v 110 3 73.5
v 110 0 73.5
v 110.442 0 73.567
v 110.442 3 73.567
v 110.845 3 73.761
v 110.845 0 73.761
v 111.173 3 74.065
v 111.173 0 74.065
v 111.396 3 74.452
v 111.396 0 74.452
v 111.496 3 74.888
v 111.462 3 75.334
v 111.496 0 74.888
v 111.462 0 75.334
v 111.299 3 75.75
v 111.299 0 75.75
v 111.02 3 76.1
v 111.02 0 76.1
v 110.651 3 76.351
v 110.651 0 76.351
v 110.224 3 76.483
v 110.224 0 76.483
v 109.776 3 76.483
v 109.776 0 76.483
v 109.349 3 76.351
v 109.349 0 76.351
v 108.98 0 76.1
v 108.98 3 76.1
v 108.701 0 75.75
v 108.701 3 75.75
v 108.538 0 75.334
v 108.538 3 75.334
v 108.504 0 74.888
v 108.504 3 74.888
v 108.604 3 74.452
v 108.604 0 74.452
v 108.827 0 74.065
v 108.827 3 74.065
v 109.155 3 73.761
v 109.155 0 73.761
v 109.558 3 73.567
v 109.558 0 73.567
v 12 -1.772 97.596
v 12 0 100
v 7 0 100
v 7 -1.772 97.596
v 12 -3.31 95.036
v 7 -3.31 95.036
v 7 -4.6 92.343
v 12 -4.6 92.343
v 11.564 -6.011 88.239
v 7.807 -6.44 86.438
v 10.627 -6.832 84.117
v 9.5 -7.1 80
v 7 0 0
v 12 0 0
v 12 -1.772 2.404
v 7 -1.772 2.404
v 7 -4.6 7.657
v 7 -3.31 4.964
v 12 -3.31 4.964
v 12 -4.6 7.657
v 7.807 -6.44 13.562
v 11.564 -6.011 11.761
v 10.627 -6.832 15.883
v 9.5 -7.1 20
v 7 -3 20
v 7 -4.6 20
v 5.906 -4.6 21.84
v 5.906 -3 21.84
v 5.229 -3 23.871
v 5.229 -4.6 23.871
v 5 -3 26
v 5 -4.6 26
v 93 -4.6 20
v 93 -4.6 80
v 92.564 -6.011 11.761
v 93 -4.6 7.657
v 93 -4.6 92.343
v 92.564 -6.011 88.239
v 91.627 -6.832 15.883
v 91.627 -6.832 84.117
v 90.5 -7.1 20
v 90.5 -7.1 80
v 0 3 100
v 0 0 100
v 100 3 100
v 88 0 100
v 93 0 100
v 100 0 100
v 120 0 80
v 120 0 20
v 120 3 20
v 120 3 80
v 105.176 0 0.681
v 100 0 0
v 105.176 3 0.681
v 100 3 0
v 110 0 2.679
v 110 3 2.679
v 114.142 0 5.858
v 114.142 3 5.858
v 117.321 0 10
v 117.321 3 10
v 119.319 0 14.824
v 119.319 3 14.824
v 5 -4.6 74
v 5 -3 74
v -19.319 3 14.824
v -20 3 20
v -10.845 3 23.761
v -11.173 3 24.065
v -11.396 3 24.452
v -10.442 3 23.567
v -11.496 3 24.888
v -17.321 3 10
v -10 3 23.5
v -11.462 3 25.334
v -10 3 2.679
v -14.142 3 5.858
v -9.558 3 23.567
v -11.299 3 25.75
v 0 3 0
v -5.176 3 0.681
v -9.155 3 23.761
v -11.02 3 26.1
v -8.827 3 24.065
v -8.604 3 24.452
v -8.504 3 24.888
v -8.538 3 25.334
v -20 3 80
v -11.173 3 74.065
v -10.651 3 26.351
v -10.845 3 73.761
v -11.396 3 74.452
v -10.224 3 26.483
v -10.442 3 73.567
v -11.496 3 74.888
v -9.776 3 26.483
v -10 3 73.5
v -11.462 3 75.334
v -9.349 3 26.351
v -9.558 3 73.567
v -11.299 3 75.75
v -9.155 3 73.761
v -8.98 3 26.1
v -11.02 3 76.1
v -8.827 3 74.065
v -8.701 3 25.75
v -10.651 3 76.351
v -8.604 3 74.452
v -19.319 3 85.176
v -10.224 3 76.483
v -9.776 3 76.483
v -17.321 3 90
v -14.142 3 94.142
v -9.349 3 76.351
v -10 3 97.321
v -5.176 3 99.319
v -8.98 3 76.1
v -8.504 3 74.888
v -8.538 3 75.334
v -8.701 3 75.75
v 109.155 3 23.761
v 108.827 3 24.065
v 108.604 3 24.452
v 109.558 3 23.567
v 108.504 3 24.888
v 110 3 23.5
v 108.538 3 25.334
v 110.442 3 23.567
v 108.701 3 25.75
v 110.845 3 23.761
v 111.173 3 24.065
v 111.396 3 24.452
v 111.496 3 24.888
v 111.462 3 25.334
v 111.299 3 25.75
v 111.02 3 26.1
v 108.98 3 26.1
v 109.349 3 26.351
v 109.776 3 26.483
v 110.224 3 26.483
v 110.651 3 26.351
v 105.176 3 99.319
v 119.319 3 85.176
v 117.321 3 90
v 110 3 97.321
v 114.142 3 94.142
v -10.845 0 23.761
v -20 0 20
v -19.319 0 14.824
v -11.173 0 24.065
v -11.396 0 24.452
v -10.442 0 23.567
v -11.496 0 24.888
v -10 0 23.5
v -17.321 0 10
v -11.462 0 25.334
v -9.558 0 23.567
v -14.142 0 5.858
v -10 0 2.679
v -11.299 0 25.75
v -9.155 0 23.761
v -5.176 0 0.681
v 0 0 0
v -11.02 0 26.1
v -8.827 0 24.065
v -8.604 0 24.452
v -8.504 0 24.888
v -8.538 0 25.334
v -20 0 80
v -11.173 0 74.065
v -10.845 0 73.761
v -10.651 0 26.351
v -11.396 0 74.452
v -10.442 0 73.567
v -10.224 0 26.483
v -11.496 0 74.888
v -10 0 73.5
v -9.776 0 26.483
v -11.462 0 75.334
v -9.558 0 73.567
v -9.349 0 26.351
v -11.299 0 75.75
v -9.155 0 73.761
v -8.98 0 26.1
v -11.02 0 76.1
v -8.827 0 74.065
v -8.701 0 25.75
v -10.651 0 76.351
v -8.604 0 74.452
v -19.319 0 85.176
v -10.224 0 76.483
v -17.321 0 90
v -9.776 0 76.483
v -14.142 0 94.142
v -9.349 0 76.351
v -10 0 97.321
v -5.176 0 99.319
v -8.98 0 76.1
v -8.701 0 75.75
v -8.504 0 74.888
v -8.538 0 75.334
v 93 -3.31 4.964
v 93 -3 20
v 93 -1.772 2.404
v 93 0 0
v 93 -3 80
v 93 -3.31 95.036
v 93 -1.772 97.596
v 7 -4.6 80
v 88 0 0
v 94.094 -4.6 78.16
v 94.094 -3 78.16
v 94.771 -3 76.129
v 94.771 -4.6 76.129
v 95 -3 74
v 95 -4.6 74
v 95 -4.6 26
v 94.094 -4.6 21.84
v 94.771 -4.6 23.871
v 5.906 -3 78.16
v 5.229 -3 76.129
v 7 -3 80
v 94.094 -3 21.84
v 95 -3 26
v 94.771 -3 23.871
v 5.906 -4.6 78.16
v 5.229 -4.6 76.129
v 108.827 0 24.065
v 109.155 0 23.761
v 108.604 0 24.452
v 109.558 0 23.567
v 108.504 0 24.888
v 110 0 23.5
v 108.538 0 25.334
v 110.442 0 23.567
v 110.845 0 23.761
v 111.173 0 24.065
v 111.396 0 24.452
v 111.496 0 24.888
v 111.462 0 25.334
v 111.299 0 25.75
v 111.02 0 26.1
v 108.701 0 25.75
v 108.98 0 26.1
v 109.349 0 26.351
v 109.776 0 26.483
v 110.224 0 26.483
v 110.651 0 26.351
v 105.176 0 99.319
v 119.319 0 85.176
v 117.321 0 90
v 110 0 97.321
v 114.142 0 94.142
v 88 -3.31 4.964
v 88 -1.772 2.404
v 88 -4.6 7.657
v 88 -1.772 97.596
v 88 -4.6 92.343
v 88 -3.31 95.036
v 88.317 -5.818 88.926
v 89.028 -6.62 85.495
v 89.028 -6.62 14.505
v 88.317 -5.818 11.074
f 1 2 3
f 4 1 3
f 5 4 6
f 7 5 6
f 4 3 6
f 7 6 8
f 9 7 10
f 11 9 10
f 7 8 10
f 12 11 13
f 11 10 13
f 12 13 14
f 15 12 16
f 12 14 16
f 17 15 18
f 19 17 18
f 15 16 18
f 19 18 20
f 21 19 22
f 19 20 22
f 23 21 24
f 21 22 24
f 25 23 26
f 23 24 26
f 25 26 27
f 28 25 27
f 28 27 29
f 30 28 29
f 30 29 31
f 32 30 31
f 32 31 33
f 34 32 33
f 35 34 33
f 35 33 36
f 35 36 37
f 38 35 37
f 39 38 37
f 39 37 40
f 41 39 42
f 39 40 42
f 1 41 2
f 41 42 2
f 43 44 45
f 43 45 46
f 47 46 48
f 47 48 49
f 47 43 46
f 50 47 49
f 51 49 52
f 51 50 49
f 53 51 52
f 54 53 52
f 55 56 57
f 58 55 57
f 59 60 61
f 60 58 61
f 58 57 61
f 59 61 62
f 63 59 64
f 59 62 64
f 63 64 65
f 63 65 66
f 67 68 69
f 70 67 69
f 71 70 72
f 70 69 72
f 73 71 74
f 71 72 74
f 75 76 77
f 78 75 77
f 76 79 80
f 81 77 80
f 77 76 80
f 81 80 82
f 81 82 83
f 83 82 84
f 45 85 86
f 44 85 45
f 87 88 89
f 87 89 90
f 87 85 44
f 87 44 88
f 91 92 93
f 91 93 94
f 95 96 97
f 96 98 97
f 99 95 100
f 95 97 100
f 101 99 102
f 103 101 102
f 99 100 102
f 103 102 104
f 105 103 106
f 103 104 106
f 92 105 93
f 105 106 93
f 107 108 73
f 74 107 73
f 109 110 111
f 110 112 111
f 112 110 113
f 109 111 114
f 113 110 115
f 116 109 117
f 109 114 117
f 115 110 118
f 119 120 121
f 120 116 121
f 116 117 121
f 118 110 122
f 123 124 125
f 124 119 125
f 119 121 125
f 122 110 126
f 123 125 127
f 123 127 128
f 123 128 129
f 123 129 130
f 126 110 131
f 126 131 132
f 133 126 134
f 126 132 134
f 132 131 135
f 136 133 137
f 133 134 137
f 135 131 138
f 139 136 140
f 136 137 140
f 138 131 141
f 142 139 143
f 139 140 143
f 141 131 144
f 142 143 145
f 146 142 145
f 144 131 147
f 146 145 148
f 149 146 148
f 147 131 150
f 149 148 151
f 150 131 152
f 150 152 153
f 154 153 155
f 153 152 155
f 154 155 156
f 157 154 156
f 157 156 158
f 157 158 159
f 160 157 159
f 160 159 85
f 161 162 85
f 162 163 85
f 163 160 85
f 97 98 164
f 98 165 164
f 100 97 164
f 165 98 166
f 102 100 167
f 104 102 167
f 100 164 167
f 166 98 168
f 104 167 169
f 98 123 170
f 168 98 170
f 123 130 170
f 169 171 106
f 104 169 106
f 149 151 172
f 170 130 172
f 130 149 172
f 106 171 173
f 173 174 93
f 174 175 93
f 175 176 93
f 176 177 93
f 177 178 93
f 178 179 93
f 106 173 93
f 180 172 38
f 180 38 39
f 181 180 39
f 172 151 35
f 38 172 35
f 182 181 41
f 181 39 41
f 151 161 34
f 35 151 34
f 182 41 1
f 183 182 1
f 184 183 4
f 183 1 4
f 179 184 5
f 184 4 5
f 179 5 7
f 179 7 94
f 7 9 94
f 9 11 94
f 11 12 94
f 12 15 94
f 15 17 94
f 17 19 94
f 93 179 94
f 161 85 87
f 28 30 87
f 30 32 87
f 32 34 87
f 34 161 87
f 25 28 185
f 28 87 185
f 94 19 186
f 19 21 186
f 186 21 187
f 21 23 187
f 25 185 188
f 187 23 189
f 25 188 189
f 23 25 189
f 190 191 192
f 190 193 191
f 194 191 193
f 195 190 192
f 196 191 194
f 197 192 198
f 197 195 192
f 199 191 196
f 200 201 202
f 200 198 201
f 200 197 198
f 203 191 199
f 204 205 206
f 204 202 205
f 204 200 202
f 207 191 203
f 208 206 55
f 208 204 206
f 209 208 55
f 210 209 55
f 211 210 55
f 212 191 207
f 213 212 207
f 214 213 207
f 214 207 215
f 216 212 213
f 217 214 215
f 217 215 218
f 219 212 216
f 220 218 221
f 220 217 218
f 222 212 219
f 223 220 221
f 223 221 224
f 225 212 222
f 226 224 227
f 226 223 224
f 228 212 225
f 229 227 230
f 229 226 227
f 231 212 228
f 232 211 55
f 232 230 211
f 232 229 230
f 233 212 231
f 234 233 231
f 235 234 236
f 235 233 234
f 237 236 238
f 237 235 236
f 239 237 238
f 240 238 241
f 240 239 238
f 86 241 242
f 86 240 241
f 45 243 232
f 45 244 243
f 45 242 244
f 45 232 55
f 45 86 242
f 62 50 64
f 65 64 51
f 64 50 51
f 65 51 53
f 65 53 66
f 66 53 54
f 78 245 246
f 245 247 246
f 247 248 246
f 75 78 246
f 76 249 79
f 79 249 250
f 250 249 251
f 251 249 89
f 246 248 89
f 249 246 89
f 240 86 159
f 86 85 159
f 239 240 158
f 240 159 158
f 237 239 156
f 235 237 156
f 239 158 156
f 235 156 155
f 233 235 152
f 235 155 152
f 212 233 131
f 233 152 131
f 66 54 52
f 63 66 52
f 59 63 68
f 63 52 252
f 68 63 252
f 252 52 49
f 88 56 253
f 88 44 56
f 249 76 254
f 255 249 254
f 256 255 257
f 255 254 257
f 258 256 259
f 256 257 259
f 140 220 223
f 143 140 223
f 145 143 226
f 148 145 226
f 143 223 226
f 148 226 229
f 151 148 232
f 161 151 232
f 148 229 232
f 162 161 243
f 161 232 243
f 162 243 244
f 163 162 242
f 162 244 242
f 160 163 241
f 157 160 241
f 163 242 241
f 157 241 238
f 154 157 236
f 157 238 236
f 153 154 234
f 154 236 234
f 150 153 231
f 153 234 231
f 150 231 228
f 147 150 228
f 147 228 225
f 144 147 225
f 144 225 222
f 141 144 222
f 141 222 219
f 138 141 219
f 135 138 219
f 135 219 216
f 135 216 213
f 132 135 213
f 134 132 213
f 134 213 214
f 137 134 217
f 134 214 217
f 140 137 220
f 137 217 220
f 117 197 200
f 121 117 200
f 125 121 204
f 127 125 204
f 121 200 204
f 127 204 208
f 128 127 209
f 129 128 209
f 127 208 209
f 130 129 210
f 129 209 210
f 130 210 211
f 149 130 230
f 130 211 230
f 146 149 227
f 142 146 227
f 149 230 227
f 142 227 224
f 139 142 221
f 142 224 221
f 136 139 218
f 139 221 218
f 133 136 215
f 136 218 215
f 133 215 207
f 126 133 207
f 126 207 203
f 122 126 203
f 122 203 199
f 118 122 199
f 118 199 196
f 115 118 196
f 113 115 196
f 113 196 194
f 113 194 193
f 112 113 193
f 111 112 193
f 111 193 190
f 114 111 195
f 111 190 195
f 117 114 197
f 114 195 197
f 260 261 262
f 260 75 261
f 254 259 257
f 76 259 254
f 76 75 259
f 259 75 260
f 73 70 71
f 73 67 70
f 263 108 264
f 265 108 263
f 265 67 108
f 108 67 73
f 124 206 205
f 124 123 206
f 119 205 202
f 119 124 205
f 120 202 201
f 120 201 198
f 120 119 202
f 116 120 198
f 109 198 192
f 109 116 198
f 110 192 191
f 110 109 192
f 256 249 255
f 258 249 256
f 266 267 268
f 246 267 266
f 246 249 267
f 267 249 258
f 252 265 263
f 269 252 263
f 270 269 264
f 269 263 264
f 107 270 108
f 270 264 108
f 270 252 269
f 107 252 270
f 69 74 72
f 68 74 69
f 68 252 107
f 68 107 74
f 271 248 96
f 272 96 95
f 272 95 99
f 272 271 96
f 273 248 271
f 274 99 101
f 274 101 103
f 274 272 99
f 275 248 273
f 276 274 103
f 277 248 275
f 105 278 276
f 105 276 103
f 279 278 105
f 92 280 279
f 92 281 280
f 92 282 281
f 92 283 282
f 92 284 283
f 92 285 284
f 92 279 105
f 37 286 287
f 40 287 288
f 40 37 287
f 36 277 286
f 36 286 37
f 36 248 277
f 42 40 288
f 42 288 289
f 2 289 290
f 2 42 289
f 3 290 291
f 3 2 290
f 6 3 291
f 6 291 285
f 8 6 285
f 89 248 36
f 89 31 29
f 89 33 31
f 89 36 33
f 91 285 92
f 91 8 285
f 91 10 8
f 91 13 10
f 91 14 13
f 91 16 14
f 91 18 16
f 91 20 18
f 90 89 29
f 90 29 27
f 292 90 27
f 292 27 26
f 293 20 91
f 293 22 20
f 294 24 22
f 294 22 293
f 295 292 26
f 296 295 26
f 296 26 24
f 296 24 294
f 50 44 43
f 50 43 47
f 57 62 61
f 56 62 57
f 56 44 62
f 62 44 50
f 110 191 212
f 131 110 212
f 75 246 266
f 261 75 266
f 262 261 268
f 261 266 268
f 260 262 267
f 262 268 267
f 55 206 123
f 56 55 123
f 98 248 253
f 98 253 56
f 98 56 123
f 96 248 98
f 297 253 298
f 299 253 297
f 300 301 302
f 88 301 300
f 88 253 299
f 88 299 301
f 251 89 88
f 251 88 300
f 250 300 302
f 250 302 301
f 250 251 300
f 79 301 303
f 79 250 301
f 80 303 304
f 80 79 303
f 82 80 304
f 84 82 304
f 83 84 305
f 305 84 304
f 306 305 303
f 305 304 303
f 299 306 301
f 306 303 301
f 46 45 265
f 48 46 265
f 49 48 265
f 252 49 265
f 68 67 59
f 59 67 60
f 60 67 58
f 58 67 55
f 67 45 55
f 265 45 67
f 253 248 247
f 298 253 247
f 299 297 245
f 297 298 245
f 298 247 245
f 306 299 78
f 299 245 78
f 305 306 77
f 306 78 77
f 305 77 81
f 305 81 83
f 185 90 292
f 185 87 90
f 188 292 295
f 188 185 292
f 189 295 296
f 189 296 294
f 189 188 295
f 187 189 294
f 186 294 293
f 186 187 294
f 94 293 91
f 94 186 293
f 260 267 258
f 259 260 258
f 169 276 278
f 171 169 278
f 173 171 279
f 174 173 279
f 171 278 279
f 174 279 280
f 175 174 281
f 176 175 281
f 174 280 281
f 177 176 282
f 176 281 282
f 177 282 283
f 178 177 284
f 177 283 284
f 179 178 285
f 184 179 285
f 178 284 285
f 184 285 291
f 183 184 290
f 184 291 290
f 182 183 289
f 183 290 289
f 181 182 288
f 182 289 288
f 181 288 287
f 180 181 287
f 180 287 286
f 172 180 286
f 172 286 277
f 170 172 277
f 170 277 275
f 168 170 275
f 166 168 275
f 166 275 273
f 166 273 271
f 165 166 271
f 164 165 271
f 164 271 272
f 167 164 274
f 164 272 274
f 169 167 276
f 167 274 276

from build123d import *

# Parameters (mm, degrees)
SKETCH_1_W          = 100
SKETCH_1_H          = 100
EXTRUDE_1_DEPTH     = 3
SKETCH_9_W          = 20
SKETCH_9_H          = 100
SKETCH_9_R          = 1.5
EXTRUDE_5_DEPTH     = 3
FILLET_1_R          = 20
EXTRUDE_6_DEPTH     = 7.1
CUT_EXTRUDE_5_DEPTH = 100
SKETCH_12_W         = 3.129471857
SKETCH_12_H         = 20
EXTRUDE_7_DEPTH     = 7.1
CUT_EXTRUDE_6_DEPTH = 100
SKETCH_14_W         = 103.339960755
SKETCH_14_H         = 14.24407727
CUT_EXTRUDE_7_DEPTH = 4
SKETCH_25_W         = 30
SKETCH_25_H         = 1.6
EXTRUDE_13_DEPTH    = 7
SKETCH_26_W         = 30
SKETCH_26_H         = 1.6
EXTRUDE_14_DEPTH    = 7
FILLET_7_R          = 10


with BuildPart() as part:
    # 草图1 → 凸台-拉伸1 (new body)
    with BuildSketch(Plane(origin=(0, 0, 0), x_dir=(1, 0, 0), z_dir=(0, 1, 0))):
        with Locations((50, -50)):
            Rectangle(SKETCH_1_W, SKETCH_1_H)
    extrude(amount=EXTRUDE_1_DEPTH)

    # 草图9 → 凸台-拉伸5 (add)
    # profile 1 of 2: a face of its own
    with BuildSketch(Plane.XZ):
        with Locations((110, 50)):
            Rectangle(SKETCH_9_W, SKETCH_9_H)
        with Locations(Location((110, 75, 0), (0, 0, 270))):
            Circle(SKETCH_9_R, mode=Mode.SUBTRACT)
        with Locations(Location((110, 25, 0), (0, 0, 270))):
            Circle(SKETCH_9_R, mode=Mode.SUBTRACT)
    # profile 2 of 2: a face of its own
    with BuildSketch(Plane.XZ):
        with Locations((-10, 50)):
            Rectangle(SKETCH_9_W, SKETCH_9_H)
        with Locations(Location((-10, 75, 0), (0, 0, 270))):
            Circle(SKETCH_9_R, mode=Mode.SUBTRACT)
        with Locations(Location((-10, 25, 0), (0, 0, 270))):
            Circle(SKETCH_9_R, mode=Mode.SUBTRACT)
    extrude(amount=-EXTRUDE_5_DEPTH)

    # 圆角1
    fillet_1_edges = [part.edges().sort_by_distance(p)[0] for p in [
        (120, 1.5, 100),
        (120, 1.5, 0),
        (-20, 1.5, 0),
        (-20, 1.5, 100),
    ]]
    fillet(fillet_1_edges, radius=FILLET_1_R)

    # 草图10 → 凸台-拉伸6 (add)
    with BuildSketch(Plane.XZ):
        Polygon((7, 50), (7, 0), (12, 0), (12, 100), (7, 100), align=None)
        Polygon((93, 50), (93, 0), (88, 0), (88, 100), (93, 100), align=None)
    extrude(amount=EXTRUDE_6_DEPTH)

    # 草图11 → 切除-拉伸5 (cut)
    with BuildSketch(Plane.XY.offset(100)):
        with BuildLine():
            Line((88, -4.6), (88, -7.1))
            Line((88, -7.1), (90.5, -7.1))
            ThreePointArc((90.5, -7.1), (88.732233047, -6.367766953), (88, -4.6))
        make_face()
        with BuildLine():
            ThreePointArc((93, -4.6), (92.267766953, -6.367766953), (90.5, -7.1))
            Line((90.5, -7.1), (93, -7.1))
            Line((93, -7.1), (93, -4.6))
        make_face()
        with BuildLine():
            ThreePointArc((12, -4.6), (11.267766953, -6.367766953), (9.5, -7.1))
            Line((9.5, -7.1), (12, -7.1))
            Line((12, -7.1), (12, -4.6))
        make_face()
        with BuildLine():
            ThreePointArc((9.5, -7.1), (7.732233047, -6.367766953), (7, -4.6))
            Line((7, -4.6), (7, -7.1))
            Line((7, -7.1), (9.5, -7.1))
        make_face()
    extrude(amount=-CUT_EXTRUDE_5_DEPTH, mode=Mode.SUBTRACT)

    # 草图12 → 凸台-拉伸7 (add)
    with BuildSketch(Plane.XZ):
        with Locations((98.435264072, 90)):
            Rectangle(SKETCH_12_W, SKETCH_12_H)
        with Locations((98.435264072, 10)):
            Rectangle(SKETCH_12_W, SKETCH_12_H)
    extrude(amount=EXTRUDE_7_DEPTH)

    # 草图13 → 切除-拉伸6 (cut)
    with BuildSketch(Plane(origin=(100, 0, 0), x_dir=(0, 0, -1), z_dir=(1, 0, 0))):
        with BuildLine():
            Line((-100, -7.1), (-100, 0))
            ThreePointArc((-100, 0), (-90.611432514, -5.27234511), (-80, -7.1))
            Line((-80, -7.1), (-100, -7.1))
        make_face()
        with BuildLine():
            Line((-20, -7.1), (0, -7.1))
            Line((0, -7.1), (0, 0))
            ThreePointArc((0, 0), (-9.388567486, -5.27234511), (-20, -7.1))
        make_face()
    extrude(amount=-CUT_EXTRUDE_6_DEPTH, mode=Mode.SUBTRACT)

    # 草图14 → 切除-拉伸7 (cut)
    with BuildSketch(Plane(origin=(100, 0, 0), x_dir=(0, 0, -1), z_dir=(1, 0, 0))):
        with Locations((-48.330019622, -7.122038635)):
            Rectangle(SKETCH_14_W, SKETCH_14_H)
    extrude(amount=-CUT_EXTRUDE_7_DEPTH, mode=Mode.SUBTRACT)

    # 草图25 → 凸台-拉伸13 (add)
    with BuildSketch(Plane.ZY.offset(-88)):
        with Locations((65, -3.8)):
            Rectangle(SKETCH_25_W, SKETCH_25_H)
        with Locations((35, -3.8)):
            Rectangle(SKETCH_25_W, SKETCH_25_H)
    extrude(amount=-EXTRUDE_13_DEPTH)

    # 草图26 → 凸台-拉伸14 (add)
    with BuildSketch(Plane(origin=(12, 0, 0), x_dir=(0, 0, -1), z_dir=(1, 0, 0))):
        with Locations((-65, -3.8)):
            Rectangle(SKETCH_26_W, SKETCH_26_H)
        with Locations((-35, -3.8)):
            Rectangle(SKETCH_26_W, SKETCH_26_H)
    extrude(amount=-EXTRUDE_14_DEPTH)

    # 圆角7
    # the kernel refuses this fillet: 10 mm, written as the material it takes off along each edge
    with BuildSketch(Plane(origin=(95, 12, 20), x_dir=(-1, 0, 0), z_dir=(0, -1, 0))) as fillet_7_piece_1_section:
        with BuildLine():
            CenterArc((10, -6), FILLET_7_R, 143.130102354, 36.869897646)
            Line((0, -6), (0, 0))
            Line((0, 0), (2, 0))
        make_face()
    fillet_7_piece_1 = extrude(amount=31.6, mode=Mode.PRIVATE)
    fillet_7_piece_1 = split(fillet_7_piece_1, bisect_by=Plane(origin=(94.505806646, 0, 22.831397785), z_dir=(0, -1, 0)), keep=Keep.TOP, mode=Mode.PRIVATE)
    add(fillet_7_piece_1, mode=Mode.SUBTRACT)
    with BuildSketch(Plane(origin=(95, -19.6, 80), x_dir=(0, 0, -1), z_dir=(0, 1, 0))) as fillet_7_piece_2_section:
        with BuildLine():
            CenterArc((6, 10), FILLET_7_R, 233.130102354, 36.869897646)
            Line((0, 2), (0, 0))
            Line((0, 0), (6, 0))
        make_face()
    fillet_7_piece_2 = extrude(amount=31.6, mode=Mode.PRIVATE)
    fillet_7_piece_2 = split(fillet_7_piece_2, bisect_by=Plane(origin=(94.505806646, 0, 77.168602215), z_dir=(0, -1, 0)), keep=Keep.TOP, mode=Mode.PRIVATE)
    add(fillet_7_piece_2, mode=Mode.SUBTRACT)
    with BuildSketch(Plane(origin=(5, -19.6, 20), x_dir=(0, 0, 1), z_dir=(0, 1, 0))) as fillet_7_piece_3_section:
        with BuildLine():
            CenterArc((6, 10), FILLET_7_R, 233.130102354, 36.869897646)
            Line((0, 2), (0, 0))
            Line((0, 0), (6, 0))
        make_face()
    fillet_7_piece_3 = extrude(amount=31.6, mode=Mode.PRIVATE)
    fillet_7_piece_3 = split(fillet_7_piece_3, bisect_by=Plane(origin=(5.494193354, 0, 22.831397785), z_dir=(0, -1, 0)), keep=Keep.TOP, mode=Mode.PRIVATE)
    add(fillet_7_piece_3, mode=Mode.SUBTRACT)
    with BuildSketch(Plane(origin=(5, 12, 80), x_dir=(1, 0, 0), z_dir=(0, -1, 0))) as fillet_7_piece_4_section:
        with BuildLine():
            CenterArc((10, -6), FILLET_7_R, 143.130102354, 36.869897646)
            Line((0, -6), (0, 0))
            Line((0, 0), (2, 0))
        make_face()
    fillet_7_piece_4 = extrude(amount=31.6, mode=Mode.PRIVATE)
    fillet_7_piece_4 = split(fillet_7_piece_4, bisect_by=Plane(origin=(5.494193354, 0, 77.168602215), z_dir=(0, -1, 0)), keep=Keep.TOP, mode=Mode.PRIVATE)
    add(fillet_7_piece_4, mode=Mode.SUBTRACT)


solid = part.part
